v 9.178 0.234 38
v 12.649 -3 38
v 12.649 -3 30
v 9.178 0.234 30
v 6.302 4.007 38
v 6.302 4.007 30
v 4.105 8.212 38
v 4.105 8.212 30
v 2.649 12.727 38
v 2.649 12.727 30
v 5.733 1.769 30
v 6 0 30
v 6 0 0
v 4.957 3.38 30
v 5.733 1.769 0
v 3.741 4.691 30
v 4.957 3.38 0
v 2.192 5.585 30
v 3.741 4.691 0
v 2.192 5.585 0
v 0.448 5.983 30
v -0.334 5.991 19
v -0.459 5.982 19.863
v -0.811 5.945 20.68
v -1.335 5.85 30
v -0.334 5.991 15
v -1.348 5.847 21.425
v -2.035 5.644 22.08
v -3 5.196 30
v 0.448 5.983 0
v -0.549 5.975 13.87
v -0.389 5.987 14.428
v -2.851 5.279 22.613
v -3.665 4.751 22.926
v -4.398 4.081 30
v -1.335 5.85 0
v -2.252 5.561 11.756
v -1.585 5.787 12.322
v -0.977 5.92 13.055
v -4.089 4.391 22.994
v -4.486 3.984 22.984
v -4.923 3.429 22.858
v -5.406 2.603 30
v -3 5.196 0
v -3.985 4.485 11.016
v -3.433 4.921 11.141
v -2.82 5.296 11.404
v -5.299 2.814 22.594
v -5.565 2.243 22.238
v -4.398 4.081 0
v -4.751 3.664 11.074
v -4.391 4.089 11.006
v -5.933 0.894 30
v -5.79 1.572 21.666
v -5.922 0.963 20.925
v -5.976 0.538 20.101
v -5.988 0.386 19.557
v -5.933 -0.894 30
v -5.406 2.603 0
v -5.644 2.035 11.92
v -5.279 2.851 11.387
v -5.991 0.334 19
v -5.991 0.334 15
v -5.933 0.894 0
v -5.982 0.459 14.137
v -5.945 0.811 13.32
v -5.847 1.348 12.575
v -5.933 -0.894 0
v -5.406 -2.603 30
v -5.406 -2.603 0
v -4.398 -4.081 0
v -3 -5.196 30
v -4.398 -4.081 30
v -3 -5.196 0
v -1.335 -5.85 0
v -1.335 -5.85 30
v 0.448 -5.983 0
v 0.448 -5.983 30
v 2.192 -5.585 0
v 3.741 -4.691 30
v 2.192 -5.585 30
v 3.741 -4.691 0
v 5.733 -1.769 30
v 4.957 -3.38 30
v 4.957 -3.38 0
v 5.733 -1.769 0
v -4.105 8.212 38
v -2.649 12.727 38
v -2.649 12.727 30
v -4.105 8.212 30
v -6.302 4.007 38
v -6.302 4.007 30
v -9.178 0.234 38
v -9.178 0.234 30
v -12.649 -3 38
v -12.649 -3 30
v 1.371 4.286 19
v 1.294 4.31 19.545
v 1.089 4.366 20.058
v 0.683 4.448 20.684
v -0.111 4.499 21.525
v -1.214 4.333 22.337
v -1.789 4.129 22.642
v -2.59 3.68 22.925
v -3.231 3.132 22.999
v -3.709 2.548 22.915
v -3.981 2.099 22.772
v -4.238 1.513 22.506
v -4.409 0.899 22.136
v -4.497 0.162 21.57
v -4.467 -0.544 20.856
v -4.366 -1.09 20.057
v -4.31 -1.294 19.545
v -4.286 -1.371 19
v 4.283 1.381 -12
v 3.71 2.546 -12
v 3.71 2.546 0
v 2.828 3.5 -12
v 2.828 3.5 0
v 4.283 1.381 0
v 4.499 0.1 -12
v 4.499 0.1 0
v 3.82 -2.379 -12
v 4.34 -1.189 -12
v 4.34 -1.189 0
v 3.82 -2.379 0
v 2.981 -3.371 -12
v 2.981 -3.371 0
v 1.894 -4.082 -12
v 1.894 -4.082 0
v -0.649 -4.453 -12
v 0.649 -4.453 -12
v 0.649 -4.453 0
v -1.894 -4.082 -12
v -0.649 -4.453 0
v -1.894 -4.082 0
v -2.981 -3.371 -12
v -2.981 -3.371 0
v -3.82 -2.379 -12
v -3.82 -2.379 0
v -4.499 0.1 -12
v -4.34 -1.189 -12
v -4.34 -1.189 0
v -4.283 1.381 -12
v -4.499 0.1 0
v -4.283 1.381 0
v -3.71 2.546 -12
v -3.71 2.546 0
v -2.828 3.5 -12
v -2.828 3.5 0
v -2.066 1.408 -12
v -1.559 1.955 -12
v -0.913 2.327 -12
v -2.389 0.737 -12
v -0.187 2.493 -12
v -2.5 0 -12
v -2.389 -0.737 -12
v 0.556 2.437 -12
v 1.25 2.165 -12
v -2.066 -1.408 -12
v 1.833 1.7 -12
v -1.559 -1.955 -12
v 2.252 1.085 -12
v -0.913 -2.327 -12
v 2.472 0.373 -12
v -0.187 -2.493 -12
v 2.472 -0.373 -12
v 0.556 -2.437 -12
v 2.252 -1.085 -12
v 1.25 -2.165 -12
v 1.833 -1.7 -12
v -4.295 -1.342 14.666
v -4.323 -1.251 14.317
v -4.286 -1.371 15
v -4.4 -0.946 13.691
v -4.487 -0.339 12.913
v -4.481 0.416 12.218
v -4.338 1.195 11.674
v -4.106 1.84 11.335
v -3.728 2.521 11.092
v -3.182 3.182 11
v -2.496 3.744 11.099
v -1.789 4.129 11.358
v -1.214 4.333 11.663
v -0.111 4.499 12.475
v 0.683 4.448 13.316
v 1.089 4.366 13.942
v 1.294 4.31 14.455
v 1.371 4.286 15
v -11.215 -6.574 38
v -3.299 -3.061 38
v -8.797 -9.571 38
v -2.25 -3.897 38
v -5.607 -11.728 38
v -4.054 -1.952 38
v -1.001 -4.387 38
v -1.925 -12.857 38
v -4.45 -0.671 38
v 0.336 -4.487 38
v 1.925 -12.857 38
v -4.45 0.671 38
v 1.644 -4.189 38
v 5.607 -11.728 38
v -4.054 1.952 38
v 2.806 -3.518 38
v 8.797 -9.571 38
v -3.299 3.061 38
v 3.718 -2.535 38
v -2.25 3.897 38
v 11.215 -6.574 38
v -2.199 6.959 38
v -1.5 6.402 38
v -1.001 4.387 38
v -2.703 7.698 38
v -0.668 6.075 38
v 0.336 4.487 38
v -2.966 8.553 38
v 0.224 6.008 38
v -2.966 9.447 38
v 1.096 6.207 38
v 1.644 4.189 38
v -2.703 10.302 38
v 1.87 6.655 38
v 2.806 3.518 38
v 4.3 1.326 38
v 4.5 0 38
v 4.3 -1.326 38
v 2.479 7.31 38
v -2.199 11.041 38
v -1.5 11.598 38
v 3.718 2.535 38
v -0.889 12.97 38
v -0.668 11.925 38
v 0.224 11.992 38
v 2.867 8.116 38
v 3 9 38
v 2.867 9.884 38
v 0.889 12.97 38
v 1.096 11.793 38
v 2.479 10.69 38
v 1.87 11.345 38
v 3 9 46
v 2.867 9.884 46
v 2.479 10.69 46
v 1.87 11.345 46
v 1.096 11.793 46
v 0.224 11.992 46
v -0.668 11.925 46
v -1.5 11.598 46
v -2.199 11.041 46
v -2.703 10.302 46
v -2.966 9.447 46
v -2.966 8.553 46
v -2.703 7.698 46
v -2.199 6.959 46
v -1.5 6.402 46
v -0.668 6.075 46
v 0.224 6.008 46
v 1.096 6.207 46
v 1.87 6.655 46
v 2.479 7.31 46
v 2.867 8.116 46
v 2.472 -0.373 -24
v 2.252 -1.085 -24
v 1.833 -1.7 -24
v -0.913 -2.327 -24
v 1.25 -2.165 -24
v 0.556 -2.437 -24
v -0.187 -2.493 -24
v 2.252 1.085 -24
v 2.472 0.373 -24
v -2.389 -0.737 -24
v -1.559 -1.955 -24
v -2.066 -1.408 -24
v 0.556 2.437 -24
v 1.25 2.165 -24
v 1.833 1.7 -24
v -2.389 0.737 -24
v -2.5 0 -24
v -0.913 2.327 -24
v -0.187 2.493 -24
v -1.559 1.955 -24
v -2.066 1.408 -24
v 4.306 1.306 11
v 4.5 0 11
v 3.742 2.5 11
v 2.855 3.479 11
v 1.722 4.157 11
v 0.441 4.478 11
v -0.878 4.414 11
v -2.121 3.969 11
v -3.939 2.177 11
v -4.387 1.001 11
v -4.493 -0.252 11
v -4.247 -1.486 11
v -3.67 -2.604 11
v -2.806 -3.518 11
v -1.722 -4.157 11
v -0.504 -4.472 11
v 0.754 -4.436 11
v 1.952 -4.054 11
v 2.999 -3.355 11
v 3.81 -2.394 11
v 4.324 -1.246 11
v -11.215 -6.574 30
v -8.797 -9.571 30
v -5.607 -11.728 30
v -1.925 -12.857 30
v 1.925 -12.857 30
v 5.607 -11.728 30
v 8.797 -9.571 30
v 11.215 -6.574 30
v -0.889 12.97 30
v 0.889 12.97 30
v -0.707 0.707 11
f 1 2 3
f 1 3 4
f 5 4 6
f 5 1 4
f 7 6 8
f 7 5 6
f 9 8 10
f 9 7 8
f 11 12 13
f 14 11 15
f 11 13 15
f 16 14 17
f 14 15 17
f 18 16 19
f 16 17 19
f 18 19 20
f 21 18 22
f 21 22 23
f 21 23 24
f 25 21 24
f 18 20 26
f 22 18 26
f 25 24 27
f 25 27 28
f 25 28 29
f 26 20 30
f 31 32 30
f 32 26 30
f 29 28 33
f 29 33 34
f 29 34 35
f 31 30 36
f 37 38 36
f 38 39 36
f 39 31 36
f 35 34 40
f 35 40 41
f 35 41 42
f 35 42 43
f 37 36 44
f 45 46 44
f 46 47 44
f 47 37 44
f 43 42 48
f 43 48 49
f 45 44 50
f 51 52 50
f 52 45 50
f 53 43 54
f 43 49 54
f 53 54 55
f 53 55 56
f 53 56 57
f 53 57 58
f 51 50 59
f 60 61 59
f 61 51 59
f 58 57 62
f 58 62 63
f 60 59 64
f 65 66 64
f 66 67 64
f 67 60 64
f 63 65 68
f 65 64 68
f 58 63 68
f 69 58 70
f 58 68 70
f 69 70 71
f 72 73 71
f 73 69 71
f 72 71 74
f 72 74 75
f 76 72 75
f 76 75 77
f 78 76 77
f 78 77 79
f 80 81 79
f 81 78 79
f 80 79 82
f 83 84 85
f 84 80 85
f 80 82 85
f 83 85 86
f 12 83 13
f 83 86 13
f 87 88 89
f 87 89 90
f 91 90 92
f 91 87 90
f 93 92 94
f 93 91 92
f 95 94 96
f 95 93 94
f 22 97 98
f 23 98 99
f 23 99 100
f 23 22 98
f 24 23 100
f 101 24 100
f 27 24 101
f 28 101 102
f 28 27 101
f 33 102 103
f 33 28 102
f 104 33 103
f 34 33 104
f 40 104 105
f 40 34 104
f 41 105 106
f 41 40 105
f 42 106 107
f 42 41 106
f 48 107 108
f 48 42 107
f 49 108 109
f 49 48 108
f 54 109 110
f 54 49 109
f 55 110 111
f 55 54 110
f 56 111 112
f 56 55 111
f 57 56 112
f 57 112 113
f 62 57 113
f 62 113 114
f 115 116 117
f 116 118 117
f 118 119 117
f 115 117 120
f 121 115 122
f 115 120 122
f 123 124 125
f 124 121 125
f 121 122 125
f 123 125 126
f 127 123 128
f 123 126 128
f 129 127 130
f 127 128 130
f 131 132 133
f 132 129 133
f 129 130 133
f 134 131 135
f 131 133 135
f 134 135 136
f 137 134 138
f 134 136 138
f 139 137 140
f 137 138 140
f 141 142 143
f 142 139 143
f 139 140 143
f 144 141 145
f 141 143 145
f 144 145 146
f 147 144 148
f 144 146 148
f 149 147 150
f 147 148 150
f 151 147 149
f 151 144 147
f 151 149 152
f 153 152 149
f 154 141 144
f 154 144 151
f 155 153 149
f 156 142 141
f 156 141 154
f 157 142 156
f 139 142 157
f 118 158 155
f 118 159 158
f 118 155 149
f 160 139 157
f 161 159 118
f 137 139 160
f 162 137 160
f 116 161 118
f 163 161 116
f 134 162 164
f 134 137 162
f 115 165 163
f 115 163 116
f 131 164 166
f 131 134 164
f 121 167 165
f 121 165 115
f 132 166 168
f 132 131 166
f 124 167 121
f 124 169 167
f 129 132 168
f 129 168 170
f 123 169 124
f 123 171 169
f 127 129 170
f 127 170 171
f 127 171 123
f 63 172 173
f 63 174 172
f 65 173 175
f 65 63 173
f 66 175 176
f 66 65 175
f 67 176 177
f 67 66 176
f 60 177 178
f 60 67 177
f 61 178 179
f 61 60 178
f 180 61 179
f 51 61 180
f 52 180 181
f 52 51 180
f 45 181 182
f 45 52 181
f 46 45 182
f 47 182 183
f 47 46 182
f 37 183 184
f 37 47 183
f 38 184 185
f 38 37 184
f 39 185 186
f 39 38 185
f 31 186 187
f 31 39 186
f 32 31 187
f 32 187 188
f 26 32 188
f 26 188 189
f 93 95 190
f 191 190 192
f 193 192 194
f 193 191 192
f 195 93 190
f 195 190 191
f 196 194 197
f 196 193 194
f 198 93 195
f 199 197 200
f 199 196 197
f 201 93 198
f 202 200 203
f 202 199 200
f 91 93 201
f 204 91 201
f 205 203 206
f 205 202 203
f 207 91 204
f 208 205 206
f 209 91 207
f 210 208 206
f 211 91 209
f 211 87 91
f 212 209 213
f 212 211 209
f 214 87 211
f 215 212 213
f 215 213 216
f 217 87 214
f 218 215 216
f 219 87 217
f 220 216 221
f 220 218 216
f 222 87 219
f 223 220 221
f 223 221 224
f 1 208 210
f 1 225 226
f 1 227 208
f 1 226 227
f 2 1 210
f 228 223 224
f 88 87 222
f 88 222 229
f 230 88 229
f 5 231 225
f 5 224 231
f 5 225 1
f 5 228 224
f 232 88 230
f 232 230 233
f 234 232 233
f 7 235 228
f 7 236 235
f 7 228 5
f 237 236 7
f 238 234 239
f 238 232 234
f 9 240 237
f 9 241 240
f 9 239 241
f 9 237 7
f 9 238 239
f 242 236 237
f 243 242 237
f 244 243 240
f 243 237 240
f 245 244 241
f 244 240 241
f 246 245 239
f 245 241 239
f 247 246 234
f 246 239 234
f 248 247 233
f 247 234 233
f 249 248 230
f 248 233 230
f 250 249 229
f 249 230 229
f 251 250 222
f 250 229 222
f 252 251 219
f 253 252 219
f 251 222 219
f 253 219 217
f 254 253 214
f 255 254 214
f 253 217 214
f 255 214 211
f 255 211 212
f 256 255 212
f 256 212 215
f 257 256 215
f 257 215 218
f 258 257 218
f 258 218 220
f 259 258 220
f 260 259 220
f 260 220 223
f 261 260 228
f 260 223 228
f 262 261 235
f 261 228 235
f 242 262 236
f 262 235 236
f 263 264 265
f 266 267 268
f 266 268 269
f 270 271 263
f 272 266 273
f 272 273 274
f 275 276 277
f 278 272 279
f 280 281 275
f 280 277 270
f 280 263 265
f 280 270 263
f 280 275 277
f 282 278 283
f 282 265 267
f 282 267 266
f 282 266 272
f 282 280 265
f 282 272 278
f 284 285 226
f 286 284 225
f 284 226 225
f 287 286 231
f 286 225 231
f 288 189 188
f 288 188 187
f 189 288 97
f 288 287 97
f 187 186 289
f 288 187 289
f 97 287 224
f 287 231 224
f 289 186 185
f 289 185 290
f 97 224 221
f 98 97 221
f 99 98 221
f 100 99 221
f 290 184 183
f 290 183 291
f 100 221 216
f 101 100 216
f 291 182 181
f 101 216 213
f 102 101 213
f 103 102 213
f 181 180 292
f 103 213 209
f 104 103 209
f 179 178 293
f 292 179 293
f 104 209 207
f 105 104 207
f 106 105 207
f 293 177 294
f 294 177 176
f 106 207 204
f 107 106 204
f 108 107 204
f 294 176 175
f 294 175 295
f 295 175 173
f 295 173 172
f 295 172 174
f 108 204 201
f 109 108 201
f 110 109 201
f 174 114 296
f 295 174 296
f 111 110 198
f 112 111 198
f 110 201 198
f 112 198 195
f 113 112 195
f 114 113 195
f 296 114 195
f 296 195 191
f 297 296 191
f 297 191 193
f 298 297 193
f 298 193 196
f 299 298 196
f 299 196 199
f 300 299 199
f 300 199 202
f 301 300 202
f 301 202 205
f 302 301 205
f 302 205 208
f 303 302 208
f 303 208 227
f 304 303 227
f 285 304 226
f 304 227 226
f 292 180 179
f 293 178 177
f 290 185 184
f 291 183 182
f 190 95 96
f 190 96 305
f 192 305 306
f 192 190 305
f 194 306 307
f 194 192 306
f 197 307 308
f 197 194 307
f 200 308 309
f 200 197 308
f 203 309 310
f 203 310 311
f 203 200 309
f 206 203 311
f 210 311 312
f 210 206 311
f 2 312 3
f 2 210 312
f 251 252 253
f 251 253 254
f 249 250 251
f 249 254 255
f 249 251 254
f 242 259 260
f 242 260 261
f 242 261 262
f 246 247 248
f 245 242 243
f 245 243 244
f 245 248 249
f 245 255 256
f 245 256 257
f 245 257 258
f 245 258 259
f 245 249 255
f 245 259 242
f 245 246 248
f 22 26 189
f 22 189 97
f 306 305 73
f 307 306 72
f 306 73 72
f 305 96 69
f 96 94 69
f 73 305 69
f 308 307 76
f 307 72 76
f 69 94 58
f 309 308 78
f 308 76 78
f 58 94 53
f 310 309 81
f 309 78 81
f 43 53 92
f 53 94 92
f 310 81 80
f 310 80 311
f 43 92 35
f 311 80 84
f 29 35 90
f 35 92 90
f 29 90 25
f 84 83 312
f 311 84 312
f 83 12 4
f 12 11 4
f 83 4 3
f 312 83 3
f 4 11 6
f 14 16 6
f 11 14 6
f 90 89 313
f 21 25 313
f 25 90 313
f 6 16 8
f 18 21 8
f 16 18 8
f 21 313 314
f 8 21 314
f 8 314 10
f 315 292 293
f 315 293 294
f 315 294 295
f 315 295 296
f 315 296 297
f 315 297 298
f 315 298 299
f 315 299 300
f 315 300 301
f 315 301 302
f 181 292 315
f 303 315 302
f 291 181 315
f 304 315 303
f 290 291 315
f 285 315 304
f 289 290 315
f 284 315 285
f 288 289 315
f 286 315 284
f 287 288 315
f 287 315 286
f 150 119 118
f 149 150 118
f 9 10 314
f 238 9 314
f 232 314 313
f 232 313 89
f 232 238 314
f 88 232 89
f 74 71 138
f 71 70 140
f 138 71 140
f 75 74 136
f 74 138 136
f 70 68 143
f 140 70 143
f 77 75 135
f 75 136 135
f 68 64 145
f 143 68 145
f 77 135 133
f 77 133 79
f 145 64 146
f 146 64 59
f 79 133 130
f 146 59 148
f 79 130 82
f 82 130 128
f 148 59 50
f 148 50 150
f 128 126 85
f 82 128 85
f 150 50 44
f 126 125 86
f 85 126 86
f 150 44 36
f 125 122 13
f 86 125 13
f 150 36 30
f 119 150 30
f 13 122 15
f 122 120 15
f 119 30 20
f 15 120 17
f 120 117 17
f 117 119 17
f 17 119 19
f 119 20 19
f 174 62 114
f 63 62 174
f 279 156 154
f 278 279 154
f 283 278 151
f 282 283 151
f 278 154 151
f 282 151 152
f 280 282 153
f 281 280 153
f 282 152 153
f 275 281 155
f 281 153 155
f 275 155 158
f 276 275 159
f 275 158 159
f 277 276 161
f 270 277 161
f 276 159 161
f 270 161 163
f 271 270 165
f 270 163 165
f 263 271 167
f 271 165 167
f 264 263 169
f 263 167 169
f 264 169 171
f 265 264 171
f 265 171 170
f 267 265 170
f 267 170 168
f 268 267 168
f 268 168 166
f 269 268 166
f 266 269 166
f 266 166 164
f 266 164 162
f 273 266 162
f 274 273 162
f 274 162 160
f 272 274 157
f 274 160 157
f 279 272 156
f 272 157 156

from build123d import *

# Parameters (mm, degrees)
SKETCH1_R           = 6
BOSS_EXTRUDE1_DEPTH = 38
SKETCH2_R           = 4.5
BOSS_EXTRUDE2_DEPTH = 12
BOSS_EXTRUDE3_DEPTH = 8
SKETCH4_R           = 3
BOSS_EXTRUDE4_DEPTH = 8
SKETCH5_R           = 4.5
CUT_EXTRUDE1_DEPTH  = 27
CUT_EXTRUDE2_DEPTH  = 5
SKETCH7_R           = 2.5
BOSS_EXTRUDE5_DEPTH = 12
SKETCH9_W           = 12
SKETCH9_H           = 1
CUT_EXTRUDE3_DEPTH  = 3.5


with BuildPart() as part:
    # Sketch1 → Boss-Extrude1 (new body)
    with BuildSketch(Plane.XY):
        Circle(SKETCH1_R)
    extrude(amount=BOSS_EXTRUDE1_DEPTH)

    # Sketch2 → Boss-Extrude2 (add)
    with BuildSketch(Plane(origin=(0, 0, 0), x_dir=(-1, 0, 0), z_dir=(0, 0, -1))):
        with Locations(Location((0, 0, 0), (0, 0, 180))):
            Circle(SKETCH2_R)
    extrude(amount=BOSS_EXTRUDE2_DEPTH)

    # Sketch3 → Boss-Extrude3 (add)
    with BuildSketch(Plane.XY.offset(38)):
        with BuildLine():
            ThreePointArc((-12.649110641, -3), (0, -13), (12.649110641, -3))
            ThreePointArc((12.649110641, -3), (6.302186147, 4.007182978), (2.649110641, 12.727223295))
            ThreePointArc((2.649110641, 12.727223295), (0, 13), (-2.649110641, 12.727223295))
            ThreePointArc((-2.649110641, 12.727223295), (-6.302186147, 4.007182978), (-12.649110641, -3))
        make_face()
    extrude(amount=-BOSS_EXTRUDE3_DEPTH)

    # Sketch4 → Boss-Extrude4 (add)
    with BuildSketch(Plane.XY.offset(38)):
        with Locations((0, 9)):
            Circle(SKETCH4_R)
    extrude(amount=BOSS_EXTRUDE4_DEPTH)

    # Sketch5 → Cut-Extrude1 (cut)
    with BuildSketch(Plane.XY.offset(38)):
        Circle(SKETCH5_R)
    extrude(amount=-CUT_EXTRUDE1_DEPTH, mode=Mode.SUBTRACT)

    # Sketch6 → Cut-Extrude2 (cut)
    with BuildSketch(Plane(origin=(-4.242640687, 4.242640687, 0), x_dir=(0, 0, -1), z_dir=(-0.7071067811865438, 0.7071067811865512, 0))):
        with BuildLine():
            Line((-19, 4), (-15, 4))
            ThreePointArc((-15, 4), (-11, 0), (-15, -4))
            Line((-15, -4), (-19, -4))
            ThreePointArc((-19, -4), (-23, 0), (-19, 4))
        make_face()
    extrude(amount=-CUT_EXTRUDE2_DEPTH, mode=Mode.SUBTRACT)

    # Sketch7 → Boss-Extrude5 (add)
    with BuildSketch(Plane(origin=(0, 0, -12), x_dir=(-1, 0, 0), z_dir=(0, 0, -1))):
        Circle(SKETCH7_R)
    extrude(amount=BOSS_EXTRUDE5_DEPTH)

    # Sketch9 → Cut-Extrude3 (cut, symmetric)
    with BuildSketch(Plane(origin=(0, 0, 0), x_dir=(0, 0, -1), z_dir=(1, 0, 0))):
        with Locations((6, 4)):
            Rectangle(SKETCH9_W, SKETCH9_H)
    extrude(amount=CUT_EXTRUDE3_DEPTH, both=True, mode=Mode.SUBTRACT)


solid = part.part
